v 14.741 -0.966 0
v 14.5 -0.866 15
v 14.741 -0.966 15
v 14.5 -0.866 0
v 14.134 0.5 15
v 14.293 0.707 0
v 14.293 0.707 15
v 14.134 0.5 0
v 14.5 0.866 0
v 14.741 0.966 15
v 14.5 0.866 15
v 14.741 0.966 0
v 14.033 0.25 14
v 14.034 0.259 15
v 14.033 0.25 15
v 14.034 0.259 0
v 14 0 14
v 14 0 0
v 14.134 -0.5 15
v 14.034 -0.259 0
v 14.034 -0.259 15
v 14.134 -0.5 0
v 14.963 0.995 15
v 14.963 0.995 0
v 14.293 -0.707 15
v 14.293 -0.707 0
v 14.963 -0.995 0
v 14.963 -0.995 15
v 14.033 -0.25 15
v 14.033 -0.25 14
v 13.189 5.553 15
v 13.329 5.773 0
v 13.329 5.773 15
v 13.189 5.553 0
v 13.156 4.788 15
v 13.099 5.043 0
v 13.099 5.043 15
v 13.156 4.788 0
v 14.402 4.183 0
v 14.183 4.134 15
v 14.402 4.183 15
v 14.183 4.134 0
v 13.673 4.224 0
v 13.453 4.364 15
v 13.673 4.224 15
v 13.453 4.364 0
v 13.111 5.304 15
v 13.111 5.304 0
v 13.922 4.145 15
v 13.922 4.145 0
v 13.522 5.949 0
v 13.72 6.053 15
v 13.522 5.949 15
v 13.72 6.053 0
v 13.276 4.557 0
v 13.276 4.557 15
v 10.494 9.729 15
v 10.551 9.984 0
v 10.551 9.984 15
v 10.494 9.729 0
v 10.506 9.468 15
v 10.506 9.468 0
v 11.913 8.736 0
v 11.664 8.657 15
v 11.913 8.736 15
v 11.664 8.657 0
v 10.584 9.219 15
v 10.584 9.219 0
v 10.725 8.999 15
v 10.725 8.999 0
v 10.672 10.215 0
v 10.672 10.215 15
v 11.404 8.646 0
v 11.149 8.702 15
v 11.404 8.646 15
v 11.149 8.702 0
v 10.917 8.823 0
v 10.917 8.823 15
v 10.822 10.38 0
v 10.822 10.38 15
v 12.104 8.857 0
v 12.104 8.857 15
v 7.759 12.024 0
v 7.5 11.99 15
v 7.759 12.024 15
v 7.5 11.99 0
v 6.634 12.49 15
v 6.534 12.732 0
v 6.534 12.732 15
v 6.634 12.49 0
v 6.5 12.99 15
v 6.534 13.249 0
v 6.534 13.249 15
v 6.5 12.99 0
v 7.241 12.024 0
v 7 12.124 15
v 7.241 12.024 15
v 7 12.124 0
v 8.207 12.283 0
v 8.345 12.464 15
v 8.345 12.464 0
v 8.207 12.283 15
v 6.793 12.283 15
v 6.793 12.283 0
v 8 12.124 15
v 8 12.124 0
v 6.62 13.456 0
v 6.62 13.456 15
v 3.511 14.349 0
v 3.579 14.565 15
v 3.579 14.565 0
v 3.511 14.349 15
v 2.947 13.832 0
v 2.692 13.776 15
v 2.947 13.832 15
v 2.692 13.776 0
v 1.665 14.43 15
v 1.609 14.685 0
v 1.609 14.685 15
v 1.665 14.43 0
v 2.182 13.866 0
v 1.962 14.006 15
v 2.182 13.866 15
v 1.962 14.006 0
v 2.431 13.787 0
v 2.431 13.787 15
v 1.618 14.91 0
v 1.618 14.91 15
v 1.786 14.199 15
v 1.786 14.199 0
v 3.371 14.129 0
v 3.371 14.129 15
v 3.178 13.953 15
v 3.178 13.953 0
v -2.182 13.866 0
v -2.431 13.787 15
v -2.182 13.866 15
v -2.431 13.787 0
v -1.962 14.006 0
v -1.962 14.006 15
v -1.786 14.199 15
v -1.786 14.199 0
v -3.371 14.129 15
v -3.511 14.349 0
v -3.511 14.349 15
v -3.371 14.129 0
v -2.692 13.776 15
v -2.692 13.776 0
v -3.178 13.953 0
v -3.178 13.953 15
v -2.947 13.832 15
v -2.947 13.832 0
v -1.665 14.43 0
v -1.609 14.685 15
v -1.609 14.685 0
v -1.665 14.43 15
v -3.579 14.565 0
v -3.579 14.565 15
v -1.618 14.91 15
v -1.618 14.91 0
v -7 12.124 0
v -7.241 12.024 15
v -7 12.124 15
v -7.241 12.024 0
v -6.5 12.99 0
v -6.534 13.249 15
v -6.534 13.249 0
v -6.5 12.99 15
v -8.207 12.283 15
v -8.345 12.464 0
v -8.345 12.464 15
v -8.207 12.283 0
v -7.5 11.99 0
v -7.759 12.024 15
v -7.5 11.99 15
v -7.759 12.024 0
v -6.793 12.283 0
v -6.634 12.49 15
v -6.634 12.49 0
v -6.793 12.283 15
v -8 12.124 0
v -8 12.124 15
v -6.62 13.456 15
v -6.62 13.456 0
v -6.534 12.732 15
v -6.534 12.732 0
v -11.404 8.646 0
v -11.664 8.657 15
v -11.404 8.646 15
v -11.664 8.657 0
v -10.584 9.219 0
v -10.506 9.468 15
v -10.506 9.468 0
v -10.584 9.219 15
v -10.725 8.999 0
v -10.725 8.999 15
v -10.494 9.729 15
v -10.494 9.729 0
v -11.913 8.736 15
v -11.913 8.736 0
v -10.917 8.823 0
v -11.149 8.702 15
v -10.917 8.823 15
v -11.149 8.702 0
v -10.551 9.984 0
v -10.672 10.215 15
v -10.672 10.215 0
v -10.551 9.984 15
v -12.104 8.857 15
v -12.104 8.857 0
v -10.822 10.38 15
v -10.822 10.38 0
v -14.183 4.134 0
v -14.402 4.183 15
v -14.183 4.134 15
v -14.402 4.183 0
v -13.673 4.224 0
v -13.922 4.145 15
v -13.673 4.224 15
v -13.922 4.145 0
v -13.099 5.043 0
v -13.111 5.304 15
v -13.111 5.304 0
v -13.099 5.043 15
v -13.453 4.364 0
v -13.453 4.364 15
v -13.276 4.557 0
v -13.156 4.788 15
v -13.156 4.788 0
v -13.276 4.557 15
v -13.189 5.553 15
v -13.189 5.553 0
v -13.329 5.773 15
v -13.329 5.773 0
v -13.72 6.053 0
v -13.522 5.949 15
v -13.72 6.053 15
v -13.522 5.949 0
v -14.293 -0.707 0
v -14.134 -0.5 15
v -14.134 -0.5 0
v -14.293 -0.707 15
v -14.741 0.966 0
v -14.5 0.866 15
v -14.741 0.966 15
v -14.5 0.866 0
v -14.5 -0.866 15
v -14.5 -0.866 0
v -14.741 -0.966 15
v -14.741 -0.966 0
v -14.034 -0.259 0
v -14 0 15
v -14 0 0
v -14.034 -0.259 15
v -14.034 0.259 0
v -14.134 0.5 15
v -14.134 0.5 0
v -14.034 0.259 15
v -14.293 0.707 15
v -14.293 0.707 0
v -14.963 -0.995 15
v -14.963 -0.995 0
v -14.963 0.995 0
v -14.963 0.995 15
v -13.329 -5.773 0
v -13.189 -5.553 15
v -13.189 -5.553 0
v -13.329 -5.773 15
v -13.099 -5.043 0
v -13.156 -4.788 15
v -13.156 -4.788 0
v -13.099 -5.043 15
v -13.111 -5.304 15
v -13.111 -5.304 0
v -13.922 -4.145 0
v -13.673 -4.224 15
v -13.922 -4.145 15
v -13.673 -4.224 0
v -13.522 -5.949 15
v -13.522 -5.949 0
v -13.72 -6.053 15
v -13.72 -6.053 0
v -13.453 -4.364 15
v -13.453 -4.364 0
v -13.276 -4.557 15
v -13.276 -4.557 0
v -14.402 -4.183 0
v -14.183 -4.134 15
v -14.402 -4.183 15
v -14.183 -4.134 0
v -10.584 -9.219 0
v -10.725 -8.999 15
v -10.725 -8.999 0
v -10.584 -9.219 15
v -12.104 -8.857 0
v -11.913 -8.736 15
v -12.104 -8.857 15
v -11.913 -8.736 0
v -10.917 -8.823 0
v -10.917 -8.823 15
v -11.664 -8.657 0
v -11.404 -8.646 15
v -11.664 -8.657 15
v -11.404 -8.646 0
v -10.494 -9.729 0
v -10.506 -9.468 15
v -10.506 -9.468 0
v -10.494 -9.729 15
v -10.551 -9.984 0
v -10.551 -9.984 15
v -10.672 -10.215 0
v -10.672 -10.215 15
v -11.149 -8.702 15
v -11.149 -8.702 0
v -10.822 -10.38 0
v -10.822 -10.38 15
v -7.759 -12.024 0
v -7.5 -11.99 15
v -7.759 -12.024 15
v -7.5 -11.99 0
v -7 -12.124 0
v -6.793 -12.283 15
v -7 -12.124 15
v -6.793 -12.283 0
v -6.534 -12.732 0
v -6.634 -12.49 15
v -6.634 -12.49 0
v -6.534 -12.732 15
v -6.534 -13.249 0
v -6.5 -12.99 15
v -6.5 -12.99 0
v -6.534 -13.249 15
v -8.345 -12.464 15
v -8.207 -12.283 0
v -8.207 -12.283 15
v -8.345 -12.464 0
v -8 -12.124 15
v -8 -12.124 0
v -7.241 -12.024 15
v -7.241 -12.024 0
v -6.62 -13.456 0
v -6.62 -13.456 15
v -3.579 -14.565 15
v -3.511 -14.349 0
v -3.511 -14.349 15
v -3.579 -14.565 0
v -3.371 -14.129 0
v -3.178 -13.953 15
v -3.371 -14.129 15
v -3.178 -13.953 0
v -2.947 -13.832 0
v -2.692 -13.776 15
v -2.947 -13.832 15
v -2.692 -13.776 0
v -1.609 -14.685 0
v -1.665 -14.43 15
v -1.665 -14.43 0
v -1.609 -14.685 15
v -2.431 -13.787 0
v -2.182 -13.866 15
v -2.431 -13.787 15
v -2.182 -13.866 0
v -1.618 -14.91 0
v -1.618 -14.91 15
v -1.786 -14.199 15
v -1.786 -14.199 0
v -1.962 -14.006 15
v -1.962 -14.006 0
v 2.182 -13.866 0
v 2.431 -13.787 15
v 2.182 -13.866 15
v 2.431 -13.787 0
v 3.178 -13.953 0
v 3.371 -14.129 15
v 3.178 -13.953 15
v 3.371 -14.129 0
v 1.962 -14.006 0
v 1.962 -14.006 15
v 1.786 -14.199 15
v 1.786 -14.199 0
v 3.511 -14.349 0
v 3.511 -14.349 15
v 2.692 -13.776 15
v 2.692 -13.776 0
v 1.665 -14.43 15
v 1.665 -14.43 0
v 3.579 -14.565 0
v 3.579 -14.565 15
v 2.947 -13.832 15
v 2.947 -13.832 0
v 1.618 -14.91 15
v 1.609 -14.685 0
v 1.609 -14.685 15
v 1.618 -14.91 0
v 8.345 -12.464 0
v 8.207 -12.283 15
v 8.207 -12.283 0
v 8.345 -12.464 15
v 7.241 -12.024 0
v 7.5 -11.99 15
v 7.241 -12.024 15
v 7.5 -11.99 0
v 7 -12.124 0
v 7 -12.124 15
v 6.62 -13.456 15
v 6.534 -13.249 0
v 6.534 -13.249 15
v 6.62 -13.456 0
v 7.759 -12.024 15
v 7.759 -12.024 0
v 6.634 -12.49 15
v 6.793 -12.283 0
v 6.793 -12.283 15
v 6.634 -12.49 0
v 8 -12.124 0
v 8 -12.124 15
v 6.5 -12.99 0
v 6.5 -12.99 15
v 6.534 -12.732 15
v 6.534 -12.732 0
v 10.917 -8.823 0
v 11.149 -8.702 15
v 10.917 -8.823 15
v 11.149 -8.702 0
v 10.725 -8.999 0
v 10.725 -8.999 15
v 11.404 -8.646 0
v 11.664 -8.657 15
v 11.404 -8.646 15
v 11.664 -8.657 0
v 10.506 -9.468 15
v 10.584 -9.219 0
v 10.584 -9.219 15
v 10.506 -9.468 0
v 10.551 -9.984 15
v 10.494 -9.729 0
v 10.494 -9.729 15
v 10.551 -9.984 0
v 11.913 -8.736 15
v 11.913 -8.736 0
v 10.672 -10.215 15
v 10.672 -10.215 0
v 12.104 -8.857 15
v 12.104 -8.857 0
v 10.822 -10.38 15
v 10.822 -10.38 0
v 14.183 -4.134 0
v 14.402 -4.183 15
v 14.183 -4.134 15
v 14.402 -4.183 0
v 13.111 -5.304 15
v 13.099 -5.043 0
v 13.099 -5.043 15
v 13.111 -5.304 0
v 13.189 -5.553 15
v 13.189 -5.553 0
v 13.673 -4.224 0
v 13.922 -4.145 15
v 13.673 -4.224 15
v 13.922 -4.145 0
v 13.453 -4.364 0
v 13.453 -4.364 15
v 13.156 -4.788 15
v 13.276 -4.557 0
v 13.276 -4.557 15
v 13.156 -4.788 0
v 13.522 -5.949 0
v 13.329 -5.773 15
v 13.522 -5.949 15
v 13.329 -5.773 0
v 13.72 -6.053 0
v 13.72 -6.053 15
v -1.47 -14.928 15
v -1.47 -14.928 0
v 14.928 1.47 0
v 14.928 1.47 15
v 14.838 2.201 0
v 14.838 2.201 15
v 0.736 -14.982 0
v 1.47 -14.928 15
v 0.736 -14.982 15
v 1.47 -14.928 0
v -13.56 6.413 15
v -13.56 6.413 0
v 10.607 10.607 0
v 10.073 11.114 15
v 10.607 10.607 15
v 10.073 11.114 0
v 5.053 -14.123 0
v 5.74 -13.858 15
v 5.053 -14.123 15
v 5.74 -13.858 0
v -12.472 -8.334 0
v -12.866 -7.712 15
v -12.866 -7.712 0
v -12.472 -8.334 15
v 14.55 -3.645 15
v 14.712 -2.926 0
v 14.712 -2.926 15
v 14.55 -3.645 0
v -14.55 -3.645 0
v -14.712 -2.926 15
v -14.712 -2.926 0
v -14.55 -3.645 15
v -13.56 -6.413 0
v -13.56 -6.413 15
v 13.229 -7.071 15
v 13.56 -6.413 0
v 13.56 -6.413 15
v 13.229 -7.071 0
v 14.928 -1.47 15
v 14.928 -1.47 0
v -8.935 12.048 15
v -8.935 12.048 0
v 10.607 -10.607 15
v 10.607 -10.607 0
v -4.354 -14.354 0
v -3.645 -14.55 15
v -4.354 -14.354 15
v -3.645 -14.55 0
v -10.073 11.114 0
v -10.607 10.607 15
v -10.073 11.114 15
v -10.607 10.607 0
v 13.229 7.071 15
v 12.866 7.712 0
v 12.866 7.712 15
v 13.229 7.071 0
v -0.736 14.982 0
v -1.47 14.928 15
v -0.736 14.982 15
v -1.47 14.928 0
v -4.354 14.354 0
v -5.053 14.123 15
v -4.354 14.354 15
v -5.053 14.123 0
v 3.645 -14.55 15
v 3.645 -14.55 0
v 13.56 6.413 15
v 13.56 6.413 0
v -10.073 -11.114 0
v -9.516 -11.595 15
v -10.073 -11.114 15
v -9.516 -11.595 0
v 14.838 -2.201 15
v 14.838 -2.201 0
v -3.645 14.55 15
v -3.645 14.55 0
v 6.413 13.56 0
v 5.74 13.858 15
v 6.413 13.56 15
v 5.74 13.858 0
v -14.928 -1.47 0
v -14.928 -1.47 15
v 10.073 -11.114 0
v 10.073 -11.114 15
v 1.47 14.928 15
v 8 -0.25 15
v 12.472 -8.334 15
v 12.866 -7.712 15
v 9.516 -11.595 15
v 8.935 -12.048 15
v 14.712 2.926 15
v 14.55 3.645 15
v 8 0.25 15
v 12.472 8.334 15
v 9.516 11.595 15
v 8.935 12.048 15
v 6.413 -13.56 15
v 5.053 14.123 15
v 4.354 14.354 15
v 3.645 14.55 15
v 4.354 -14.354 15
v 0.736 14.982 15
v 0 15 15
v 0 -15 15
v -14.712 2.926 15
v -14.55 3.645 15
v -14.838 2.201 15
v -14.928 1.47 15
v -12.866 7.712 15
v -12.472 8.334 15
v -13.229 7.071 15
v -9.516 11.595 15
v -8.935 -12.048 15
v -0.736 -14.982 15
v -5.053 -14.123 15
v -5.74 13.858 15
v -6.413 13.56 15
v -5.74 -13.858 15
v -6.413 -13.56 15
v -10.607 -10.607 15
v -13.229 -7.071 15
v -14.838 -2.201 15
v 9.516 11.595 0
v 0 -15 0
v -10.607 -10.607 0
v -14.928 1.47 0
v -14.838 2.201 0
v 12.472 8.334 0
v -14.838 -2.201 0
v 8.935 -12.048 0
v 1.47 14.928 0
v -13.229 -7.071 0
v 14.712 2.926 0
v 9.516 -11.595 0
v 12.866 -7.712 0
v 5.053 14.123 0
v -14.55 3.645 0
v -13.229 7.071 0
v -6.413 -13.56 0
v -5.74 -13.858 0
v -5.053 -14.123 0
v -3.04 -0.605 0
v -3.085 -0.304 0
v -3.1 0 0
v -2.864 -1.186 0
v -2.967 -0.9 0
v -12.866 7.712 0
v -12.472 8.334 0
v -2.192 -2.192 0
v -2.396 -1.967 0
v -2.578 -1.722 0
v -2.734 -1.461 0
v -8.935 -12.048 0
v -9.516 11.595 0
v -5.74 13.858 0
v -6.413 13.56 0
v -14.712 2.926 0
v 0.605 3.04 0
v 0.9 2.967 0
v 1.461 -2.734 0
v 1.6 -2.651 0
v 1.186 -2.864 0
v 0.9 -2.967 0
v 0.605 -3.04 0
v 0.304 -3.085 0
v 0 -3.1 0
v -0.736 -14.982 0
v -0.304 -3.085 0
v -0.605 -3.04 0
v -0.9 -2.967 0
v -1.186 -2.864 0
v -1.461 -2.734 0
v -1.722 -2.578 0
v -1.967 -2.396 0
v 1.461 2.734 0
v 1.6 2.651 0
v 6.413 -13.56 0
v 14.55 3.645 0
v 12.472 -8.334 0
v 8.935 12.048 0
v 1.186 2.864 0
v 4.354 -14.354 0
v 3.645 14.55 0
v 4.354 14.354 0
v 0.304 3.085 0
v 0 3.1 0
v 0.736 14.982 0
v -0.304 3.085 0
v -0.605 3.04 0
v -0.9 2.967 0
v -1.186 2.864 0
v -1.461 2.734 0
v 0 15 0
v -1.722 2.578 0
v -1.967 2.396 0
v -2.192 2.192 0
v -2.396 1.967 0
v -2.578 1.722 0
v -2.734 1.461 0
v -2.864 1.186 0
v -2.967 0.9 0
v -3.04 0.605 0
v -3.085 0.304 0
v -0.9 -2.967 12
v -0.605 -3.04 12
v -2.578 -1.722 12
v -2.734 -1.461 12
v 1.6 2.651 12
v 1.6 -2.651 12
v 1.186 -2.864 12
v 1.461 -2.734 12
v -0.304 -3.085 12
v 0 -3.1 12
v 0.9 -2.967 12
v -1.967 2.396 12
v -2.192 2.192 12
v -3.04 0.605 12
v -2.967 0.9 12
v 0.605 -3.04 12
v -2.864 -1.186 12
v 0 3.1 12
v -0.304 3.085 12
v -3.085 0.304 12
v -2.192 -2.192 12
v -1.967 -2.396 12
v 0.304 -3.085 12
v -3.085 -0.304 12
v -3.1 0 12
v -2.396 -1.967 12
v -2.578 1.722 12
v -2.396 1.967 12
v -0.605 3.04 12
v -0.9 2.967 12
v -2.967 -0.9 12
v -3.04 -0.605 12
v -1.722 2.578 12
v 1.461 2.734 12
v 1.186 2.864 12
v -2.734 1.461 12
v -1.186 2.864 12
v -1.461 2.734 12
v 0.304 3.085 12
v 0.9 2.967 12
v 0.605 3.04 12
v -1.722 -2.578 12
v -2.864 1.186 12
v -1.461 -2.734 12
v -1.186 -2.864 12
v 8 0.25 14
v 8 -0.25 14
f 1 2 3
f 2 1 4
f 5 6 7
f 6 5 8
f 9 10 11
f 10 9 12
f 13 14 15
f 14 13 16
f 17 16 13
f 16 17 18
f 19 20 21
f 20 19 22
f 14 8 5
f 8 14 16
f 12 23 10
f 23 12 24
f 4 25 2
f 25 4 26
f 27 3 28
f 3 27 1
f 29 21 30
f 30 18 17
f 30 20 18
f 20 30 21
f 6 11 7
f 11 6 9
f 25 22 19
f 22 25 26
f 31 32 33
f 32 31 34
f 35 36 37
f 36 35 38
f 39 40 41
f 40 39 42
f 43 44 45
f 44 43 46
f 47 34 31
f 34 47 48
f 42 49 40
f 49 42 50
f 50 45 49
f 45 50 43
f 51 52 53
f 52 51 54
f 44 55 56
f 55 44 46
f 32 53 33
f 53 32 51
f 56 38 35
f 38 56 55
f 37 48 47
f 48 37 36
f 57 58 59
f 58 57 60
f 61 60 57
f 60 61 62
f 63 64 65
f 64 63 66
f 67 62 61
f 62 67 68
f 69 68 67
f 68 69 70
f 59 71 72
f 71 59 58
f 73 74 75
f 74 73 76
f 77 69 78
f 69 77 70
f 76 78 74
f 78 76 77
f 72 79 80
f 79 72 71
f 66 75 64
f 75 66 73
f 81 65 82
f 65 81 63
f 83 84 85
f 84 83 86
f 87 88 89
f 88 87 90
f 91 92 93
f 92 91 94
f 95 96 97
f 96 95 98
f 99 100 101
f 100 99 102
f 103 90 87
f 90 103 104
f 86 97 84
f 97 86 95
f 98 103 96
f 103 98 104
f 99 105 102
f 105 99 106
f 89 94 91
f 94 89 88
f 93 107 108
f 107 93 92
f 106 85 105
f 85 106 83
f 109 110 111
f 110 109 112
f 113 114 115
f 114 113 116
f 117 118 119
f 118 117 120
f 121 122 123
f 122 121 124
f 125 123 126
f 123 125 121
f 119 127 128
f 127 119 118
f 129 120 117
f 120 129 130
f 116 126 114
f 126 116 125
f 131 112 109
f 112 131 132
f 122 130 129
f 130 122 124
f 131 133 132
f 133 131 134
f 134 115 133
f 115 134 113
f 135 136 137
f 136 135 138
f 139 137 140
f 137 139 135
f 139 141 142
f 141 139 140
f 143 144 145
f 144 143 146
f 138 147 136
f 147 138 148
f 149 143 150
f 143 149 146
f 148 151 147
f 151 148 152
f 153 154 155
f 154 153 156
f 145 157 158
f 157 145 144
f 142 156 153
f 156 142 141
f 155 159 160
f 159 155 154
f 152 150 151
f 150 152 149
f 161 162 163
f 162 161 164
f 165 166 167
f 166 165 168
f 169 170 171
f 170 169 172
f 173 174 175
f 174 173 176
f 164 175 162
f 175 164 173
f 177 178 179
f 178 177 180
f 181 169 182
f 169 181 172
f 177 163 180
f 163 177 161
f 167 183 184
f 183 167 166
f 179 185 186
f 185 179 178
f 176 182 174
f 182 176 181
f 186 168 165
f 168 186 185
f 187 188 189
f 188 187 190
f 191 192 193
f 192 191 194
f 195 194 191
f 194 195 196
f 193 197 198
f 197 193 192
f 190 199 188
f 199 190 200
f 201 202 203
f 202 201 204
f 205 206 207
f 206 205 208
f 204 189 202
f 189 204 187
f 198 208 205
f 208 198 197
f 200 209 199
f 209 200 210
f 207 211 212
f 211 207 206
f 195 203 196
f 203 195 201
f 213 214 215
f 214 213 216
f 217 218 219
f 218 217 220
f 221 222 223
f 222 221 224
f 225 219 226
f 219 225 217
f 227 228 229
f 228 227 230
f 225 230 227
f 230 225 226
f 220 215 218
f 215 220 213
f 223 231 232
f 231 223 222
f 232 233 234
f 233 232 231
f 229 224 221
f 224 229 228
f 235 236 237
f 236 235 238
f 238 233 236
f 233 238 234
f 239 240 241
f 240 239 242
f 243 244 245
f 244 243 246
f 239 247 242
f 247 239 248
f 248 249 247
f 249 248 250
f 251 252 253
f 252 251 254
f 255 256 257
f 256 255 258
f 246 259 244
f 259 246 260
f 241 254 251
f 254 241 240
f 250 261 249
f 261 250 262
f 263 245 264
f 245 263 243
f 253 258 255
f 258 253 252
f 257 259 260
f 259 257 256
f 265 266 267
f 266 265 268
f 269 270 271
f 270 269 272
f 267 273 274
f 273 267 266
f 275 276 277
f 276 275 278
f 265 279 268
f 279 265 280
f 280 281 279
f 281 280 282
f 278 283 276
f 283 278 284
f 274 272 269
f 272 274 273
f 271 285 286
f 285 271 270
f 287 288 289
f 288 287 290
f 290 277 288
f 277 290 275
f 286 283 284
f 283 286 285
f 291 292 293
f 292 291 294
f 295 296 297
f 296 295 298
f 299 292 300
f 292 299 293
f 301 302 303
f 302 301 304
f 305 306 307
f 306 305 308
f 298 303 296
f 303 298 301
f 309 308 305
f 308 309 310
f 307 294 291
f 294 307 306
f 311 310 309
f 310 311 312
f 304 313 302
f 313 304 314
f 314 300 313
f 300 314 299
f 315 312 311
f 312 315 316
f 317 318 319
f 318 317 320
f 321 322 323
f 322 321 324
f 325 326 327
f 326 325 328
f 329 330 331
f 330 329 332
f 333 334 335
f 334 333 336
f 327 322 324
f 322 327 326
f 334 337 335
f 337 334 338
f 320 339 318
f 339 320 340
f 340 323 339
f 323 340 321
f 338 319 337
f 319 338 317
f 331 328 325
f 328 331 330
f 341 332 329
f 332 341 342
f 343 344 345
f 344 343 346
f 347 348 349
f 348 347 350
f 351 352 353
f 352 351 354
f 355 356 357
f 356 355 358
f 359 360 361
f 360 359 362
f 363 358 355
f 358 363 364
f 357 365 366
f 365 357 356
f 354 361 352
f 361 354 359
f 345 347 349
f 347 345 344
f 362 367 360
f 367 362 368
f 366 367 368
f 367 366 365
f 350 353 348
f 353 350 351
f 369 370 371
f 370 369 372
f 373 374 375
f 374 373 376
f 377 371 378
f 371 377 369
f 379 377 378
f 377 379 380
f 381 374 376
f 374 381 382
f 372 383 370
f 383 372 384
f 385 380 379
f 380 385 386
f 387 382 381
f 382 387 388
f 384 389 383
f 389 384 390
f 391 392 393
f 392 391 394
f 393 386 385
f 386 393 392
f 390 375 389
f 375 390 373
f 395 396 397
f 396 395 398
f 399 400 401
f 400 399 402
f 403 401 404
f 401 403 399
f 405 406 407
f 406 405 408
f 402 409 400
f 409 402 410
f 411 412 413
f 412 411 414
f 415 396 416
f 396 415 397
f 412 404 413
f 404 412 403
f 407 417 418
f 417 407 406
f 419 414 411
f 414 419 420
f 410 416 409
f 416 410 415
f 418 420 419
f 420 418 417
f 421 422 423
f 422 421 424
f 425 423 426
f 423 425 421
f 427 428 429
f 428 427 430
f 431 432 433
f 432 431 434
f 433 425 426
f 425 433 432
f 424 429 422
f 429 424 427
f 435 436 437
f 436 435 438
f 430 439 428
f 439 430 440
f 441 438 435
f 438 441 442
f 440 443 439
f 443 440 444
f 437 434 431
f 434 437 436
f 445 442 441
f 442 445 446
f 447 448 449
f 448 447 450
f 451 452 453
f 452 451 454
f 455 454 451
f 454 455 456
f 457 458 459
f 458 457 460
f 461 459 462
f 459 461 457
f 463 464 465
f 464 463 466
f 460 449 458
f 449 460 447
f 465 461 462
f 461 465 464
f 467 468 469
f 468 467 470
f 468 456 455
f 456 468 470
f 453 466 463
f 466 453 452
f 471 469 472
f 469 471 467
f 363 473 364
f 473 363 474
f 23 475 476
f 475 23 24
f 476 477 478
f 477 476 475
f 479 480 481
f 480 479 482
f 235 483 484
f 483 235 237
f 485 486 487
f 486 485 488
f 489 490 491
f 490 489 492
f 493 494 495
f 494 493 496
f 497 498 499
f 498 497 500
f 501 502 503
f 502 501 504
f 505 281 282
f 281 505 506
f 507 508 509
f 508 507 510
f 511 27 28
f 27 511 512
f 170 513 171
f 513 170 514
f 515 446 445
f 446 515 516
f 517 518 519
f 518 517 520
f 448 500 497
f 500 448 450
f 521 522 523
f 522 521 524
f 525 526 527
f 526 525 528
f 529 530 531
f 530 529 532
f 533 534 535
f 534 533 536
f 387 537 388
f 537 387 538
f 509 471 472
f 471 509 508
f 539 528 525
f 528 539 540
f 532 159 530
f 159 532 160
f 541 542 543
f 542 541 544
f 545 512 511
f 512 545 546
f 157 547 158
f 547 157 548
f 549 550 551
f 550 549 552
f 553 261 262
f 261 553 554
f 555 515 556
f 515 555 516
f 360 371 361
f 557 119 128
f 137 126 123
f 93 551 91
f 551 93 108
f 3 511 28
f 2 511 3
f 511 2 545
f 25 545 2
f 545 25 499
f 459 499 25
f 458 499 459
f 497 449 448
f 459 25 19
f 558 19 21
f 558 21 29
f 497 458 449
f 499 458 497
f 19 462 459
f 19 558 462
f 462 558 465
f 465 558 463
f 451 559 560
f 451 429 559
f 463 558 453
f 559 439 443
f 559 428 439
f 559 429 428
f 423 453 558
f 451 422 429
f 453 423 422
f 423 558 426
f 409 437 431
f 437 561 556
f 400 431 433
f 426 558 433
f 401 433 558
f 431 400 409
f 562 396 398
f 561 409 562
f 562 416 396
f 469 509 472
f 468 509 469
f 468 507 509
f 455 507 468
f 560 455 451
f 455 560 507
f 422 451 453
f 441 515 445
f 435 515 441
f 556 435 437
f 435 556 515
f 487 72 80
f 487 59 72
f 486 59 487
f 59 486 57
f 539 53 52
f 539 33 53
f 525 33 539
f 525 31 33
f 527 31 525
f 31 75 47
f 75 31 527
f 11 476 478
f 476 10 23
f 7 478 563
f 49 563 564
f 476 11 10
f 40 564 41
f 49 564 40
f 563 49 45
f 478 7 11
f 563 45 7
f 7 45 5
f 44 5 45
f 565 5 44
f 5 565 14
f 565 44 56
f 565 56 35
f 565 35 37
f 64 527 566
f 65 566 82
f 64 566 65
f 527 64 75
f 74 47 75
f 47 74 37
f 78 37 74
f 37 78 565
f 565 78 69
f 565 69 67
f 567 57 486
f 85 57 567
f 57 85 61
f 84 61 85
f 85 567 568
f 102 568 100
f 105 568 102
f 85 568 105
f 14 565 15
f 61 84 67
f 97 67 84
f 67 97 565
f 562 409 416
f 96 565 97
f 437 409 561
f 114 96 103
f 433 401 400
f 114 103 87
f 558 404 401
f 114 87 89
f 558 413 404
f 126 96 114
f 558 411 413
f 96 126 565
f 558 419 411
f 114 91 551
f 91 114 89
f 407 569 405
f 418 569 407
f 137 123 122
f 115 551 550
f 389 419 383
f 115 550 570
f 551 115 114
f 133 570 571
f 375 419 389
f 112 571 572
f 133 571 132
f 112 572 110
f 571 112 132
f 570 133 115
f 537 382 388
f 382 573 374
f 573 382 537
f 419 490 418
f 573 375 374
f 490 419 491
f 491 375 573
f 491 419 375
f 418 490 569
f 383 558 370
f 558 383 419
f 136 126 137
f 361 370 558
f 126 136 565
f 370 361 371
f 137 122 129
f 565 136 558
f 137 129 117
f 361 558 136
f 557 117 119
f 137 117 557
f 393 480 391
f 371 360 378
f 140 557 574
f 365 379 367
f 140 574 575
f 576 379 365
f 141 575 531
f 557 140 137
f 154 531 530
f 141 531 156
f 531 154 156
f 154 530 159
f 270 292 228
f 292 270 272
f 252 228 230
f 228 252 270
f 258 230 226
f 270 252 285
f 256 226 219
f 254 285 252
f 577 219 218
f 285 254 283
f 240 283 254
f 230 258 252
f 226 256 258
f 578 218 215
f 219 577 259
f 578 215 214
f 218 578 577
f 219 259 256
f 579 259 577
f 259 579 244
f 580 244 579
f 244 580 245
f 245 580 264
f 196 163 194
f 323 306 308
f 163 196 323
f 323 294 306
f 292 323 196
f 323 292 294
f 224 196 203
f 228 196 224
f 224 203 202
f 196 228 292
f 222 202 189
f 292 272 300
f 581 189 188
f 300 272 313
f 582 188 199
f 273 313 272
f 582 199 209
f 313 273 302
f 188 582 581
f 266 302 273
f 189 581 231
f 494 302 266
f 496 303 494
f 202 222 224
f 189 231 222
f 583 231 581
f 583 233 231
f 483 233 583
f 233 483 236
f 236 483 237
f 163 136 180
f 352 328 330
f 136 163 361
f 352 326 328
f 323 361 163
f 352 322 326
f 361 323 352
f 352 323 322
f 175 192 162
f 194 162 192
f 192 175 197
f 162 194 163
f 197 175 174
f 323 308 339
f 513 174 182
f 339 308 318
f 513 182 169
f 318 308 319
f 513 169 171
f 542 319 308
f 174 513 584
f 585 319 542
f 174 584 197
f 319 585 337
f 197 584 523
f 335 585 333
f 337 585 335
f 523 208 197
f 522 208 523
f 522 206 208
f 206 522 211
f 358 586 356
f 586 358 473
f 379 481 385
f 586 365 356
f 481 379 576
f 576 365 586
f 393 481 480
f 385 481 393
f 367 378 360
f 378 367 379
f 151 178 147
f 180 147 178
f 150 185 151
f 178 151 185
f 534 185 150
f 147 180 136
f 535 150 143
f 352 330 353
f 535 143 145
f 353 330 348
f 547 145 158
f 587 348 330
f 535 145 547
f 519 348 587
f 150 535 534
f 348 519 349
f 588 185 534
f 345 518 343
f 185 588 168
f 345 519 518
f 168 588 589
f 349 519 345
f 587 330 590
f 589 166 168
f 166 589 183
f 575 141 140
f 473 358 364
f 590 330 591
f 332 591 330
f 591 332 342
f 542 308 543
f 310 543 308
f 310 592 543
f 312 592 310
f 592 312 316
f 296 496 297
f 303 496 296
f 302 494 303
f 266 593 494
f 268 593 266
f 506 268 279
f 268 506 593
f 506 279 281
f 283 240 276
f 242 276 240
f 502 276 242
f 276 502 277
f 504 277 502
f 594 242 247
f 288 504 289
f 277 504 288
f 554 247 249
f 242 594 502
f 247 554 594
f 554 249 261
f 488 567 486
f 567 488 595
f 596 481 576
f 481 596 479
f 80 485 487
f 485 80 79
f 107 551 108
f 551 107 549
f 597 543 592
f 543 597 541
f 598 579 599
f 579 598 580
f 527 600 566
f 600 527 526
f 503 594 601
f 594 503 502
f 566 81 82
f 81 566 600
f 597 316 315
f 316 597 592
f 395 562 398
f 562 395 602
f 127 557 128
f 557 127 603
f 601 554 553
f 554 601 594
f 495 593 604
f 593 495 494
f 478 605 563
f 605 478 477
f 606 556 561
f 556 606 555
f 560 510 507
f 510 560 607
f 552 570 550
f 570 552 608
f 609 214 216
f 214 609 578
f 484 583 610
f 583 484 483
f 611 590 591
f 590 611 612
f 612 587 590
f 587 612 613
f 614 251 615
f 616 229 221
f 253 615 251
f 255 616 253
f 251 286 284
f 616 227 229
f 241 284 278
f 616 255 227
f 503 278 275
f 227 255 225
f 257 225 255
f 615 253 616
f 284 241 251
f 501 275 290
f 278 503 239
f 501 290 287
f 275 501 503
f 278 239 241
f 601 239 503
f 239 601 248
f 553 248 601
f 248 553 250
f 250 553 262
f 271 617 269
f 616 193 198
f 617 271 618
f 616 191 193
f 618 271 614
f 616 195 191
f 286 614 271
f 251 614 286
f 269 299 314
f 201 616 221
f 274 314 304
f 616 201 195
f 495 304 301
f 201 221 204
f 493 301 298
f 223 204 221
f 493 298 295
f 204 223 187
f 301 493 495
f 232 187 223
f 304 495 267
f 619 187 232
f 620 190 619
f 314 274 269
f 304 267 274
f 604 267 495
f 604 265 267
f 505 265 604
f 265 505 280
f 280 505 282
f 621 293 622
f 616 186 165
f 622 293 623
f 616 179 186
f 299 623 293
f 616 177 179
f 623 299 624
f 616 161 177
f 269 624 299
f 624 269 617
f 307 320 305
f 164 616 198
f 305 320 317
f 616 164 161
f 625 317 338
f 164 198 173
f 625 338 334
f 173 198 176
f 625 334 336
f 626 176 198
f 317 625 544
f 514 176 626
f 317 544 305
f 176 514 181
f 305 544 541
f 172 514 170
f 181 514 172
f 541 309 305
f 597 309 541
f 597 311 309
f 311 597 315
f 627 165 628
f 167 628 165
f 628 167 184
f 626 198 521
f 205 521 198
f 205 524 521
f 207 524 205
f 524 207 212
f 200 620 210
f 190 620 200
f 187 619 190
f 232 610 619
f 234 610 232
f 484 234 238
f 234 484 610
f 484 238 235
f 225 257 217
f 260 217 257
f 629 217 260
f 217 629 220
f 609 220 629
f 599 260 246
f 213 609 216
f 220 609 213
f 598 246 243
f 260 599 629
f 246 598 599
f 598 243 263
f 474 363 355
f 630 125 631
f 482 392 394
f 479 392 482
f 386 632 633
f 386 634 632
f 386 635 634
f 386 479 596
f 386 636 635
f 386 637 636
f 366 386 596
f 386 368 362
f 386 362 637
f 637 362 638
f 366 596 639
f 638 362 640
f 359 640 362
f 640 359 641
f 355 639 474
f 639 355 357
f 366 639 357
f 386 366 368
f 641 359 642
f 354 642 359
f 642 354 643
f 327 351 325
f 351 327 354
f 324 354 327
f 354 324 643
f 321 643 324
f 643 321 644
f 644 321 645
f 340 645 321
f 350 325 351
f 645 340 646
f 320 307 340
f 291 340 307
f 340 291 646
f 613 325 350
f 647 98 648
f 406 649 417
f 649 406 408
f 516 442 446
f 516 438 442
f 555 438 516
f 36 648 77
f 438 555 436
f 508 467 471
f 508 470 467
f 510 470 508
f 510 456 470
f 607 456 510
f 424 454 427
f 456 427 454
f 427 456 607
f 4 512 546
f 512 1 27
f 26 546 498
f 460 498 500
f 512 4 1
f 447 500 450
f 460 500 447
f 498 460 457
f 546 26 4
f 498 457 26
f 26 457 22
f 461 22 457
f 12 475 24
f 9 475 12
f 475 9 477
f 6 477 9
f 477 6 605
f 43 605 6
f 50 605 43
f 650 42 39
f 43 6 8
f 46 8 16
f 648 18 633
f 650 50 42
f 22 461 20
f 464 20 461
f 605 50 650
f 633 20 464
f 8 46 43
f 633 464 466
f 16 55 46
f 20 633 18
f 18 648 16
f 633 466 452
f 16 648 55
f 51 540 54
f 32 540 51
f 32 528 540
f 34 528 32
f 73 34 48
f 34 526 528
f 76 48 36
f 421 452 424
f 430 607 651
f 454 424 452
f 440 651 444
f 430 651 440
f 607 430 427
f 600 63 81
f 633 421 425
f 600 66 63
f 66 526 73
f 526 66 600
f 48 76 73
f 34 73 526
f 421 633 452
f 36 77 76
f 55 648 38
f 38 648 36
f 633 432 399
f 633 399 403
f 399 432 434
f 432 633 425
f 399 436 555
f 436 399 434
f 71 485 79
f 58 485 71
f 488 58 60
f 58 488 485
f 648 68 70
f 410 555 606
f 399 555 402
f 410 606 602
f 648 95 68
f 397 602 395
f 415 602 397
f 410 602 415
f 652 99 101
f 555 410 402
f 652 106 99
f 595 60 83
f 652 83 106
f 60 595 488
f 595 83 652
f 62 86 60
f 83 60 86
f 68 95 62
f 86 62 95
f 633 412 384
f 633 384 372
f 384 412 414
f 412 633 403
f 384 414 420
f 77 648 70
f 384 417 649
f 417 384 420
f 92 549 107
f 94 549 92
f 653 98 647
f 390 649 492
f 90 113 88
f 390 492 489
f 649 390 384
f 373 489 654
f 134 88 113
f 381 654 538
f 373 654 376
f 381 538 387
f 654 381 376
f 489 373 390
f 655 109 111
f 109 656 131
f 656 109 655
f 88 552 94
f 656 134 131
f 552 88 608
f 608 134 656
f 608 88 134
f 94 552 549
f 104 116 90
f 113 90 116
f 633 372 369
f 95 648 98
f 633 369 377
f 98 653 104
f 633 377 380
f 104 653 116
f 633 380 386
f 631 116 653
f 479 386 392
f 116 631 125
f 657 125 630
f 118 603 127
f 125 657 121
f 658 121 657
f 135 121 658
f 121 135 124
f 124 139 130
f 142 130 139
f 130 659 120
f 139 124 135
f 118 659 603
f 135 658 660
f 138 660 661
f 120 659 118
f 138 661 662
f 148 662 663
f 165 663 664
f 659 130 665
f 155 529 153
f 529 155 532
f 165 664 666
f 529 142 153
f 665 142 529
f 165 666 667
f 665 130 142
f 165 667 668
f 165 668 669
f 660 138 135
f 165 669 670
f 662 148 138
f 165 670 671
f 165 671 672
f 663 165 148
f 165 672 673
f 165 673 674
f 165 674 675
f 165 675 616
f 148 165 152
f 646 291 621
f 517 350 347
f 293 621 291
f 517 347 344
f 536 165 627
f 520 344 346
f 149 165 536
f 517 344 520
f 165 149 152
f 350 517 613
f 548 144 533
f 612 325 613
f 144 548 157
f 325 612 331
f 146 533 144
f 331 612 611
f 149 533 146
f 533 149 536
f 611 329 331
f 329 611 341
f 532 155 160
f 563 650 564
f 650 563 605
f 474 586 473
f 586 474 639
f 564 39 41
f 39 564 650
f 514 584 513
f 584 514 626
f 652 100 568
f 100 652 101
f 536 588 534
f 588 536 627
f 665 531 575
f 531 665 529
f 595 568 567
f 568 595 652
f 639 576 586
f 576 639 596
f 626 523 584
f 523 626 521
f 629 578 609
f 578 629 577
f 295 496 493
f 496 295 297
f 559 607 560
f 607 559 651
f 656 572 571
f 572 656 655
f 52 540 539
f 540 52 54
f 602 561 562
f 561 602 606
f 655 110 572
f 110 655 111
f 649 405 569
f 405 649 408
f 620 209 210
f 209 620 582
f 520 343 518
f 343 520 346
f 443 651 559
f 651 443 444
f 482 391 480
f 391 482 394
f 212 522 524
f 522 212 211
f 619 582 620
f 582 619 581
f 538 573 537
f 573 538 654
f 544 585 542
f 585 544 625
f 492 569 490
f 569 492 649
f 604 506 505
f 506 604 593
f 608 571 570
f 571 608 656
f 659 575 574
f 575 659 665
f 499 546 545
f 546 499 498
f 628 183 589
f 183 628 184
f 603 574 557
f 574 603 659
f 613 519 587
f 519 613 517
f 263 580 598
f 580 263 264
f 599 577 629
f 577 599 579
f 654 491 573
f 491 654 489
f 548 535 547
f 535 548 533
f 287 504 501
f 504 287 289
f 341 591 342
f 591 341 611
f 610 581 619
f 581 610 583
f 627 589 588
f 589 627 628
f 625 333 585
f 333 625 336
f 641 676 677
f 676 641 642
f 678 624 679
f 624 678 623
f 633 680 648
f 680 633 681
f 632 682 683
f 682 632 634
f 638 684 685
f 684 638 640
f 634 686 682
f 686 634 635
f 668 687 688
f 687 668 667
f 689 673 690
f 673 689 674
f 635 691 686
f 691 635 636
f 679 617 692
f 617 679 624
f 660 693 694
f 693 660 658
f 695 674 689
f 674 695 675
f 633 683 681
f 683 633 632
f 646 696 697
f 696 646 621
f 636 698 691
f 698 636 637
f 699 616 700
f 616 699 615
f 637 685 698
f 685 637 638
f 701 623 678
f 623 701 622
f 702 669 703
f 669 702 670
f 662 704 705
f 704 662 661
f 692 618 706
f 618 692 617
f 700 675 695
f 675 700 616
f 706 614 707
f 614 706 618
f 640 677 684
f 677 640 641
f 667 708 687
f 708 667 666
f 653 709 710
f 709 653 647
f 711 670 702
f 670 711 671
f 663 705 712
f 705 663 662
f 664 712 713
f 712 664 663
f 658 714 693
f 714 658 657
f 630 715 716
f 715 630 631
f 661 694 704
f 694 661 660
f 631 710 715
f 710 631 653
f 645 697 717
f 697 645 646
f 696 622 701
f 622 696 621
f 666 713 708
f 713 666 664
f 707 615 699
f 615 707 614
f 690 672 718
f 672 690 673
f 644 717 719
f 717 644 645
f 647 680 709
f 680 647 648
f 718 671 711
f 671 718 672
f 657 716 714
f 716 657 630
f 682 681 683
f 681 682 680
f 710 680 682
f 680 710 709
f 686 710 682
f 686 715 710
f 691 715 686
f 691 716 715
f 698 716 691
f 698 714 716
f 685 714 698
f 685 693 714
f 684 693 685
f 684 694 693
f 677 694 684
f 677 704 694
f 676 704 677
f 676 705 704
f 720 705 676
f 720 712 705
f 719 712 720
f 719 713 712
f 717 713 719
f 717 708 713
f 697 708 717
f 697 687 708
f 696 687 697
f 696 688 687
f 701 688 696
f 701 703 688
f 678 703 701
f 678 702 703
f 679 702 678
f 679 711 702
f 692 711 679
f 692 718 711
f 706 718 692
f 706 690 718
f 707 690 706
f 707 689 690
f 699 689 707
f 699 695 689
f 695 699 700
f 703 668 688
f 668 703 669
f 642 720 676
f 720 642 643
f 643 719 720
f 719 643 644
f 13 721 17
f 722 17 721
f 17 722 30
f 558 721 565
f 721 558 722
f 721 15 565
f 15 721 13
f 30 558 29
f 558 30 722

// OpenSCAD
// Replacement knob for a 6 mm D-shaft (hotplates, stirrers, power supplies)
// Category: quick fixes. D-shaped blind bore from the bottom, grip grooves and a
// pointer groove on top that lines up with the flat of the shaft.
// Print: PETG (heat near hotplates), 0.15 mm layers, 4 perimeters, bore face down.
// SPDX-License-Identifier: CERN-OHL-P-2.0

/* [Knob] */
knob_d = 30;
knob_h = 15;
shaft_d = 6.2;         // 6 mm shaft + 0.2 mm clearance
shaft_flat = 4.7;      // flat-to-round distance (4.5 mm nominal + clearance)
bore_depth = 12;
n_grooves = 18;
groove_d = 2;
pointer_w = 0.5;
pointer_depth = 1;

/* [Hidden] */
eps = 0.01;

difference() {
    cylinder(d = knob_d, h = knob_h, $fn = 128);
    // D-shaped bore; the flat faces +X
    translate([0, 0, -eps])
        linear_extrude(bore_depth + eps)
            intersection() {
                circle(d = shaft_d, $fn = 64);
                translate([-shaft_d / 2, -shaft_d / 2]) square([shaft_flat, shaft_d]);
            }
    // grip grooves
    for (i = [0 : n_grooves - 1])
        rotate(i * 360 / n_grooves)
            translate([knob_d / 2, 0, -eps]) cylinder(d = groove_d, h = knob_h + 2 * eps, $fn = 24);
    // pointer groove on top, pointing at the flat (+X)
    translate([8, -pointer_w / 2, knob_h - pointer_depth])
        cube([knob_d / 2 + 1, pointer_w, pointer_depth + eps]);
}
